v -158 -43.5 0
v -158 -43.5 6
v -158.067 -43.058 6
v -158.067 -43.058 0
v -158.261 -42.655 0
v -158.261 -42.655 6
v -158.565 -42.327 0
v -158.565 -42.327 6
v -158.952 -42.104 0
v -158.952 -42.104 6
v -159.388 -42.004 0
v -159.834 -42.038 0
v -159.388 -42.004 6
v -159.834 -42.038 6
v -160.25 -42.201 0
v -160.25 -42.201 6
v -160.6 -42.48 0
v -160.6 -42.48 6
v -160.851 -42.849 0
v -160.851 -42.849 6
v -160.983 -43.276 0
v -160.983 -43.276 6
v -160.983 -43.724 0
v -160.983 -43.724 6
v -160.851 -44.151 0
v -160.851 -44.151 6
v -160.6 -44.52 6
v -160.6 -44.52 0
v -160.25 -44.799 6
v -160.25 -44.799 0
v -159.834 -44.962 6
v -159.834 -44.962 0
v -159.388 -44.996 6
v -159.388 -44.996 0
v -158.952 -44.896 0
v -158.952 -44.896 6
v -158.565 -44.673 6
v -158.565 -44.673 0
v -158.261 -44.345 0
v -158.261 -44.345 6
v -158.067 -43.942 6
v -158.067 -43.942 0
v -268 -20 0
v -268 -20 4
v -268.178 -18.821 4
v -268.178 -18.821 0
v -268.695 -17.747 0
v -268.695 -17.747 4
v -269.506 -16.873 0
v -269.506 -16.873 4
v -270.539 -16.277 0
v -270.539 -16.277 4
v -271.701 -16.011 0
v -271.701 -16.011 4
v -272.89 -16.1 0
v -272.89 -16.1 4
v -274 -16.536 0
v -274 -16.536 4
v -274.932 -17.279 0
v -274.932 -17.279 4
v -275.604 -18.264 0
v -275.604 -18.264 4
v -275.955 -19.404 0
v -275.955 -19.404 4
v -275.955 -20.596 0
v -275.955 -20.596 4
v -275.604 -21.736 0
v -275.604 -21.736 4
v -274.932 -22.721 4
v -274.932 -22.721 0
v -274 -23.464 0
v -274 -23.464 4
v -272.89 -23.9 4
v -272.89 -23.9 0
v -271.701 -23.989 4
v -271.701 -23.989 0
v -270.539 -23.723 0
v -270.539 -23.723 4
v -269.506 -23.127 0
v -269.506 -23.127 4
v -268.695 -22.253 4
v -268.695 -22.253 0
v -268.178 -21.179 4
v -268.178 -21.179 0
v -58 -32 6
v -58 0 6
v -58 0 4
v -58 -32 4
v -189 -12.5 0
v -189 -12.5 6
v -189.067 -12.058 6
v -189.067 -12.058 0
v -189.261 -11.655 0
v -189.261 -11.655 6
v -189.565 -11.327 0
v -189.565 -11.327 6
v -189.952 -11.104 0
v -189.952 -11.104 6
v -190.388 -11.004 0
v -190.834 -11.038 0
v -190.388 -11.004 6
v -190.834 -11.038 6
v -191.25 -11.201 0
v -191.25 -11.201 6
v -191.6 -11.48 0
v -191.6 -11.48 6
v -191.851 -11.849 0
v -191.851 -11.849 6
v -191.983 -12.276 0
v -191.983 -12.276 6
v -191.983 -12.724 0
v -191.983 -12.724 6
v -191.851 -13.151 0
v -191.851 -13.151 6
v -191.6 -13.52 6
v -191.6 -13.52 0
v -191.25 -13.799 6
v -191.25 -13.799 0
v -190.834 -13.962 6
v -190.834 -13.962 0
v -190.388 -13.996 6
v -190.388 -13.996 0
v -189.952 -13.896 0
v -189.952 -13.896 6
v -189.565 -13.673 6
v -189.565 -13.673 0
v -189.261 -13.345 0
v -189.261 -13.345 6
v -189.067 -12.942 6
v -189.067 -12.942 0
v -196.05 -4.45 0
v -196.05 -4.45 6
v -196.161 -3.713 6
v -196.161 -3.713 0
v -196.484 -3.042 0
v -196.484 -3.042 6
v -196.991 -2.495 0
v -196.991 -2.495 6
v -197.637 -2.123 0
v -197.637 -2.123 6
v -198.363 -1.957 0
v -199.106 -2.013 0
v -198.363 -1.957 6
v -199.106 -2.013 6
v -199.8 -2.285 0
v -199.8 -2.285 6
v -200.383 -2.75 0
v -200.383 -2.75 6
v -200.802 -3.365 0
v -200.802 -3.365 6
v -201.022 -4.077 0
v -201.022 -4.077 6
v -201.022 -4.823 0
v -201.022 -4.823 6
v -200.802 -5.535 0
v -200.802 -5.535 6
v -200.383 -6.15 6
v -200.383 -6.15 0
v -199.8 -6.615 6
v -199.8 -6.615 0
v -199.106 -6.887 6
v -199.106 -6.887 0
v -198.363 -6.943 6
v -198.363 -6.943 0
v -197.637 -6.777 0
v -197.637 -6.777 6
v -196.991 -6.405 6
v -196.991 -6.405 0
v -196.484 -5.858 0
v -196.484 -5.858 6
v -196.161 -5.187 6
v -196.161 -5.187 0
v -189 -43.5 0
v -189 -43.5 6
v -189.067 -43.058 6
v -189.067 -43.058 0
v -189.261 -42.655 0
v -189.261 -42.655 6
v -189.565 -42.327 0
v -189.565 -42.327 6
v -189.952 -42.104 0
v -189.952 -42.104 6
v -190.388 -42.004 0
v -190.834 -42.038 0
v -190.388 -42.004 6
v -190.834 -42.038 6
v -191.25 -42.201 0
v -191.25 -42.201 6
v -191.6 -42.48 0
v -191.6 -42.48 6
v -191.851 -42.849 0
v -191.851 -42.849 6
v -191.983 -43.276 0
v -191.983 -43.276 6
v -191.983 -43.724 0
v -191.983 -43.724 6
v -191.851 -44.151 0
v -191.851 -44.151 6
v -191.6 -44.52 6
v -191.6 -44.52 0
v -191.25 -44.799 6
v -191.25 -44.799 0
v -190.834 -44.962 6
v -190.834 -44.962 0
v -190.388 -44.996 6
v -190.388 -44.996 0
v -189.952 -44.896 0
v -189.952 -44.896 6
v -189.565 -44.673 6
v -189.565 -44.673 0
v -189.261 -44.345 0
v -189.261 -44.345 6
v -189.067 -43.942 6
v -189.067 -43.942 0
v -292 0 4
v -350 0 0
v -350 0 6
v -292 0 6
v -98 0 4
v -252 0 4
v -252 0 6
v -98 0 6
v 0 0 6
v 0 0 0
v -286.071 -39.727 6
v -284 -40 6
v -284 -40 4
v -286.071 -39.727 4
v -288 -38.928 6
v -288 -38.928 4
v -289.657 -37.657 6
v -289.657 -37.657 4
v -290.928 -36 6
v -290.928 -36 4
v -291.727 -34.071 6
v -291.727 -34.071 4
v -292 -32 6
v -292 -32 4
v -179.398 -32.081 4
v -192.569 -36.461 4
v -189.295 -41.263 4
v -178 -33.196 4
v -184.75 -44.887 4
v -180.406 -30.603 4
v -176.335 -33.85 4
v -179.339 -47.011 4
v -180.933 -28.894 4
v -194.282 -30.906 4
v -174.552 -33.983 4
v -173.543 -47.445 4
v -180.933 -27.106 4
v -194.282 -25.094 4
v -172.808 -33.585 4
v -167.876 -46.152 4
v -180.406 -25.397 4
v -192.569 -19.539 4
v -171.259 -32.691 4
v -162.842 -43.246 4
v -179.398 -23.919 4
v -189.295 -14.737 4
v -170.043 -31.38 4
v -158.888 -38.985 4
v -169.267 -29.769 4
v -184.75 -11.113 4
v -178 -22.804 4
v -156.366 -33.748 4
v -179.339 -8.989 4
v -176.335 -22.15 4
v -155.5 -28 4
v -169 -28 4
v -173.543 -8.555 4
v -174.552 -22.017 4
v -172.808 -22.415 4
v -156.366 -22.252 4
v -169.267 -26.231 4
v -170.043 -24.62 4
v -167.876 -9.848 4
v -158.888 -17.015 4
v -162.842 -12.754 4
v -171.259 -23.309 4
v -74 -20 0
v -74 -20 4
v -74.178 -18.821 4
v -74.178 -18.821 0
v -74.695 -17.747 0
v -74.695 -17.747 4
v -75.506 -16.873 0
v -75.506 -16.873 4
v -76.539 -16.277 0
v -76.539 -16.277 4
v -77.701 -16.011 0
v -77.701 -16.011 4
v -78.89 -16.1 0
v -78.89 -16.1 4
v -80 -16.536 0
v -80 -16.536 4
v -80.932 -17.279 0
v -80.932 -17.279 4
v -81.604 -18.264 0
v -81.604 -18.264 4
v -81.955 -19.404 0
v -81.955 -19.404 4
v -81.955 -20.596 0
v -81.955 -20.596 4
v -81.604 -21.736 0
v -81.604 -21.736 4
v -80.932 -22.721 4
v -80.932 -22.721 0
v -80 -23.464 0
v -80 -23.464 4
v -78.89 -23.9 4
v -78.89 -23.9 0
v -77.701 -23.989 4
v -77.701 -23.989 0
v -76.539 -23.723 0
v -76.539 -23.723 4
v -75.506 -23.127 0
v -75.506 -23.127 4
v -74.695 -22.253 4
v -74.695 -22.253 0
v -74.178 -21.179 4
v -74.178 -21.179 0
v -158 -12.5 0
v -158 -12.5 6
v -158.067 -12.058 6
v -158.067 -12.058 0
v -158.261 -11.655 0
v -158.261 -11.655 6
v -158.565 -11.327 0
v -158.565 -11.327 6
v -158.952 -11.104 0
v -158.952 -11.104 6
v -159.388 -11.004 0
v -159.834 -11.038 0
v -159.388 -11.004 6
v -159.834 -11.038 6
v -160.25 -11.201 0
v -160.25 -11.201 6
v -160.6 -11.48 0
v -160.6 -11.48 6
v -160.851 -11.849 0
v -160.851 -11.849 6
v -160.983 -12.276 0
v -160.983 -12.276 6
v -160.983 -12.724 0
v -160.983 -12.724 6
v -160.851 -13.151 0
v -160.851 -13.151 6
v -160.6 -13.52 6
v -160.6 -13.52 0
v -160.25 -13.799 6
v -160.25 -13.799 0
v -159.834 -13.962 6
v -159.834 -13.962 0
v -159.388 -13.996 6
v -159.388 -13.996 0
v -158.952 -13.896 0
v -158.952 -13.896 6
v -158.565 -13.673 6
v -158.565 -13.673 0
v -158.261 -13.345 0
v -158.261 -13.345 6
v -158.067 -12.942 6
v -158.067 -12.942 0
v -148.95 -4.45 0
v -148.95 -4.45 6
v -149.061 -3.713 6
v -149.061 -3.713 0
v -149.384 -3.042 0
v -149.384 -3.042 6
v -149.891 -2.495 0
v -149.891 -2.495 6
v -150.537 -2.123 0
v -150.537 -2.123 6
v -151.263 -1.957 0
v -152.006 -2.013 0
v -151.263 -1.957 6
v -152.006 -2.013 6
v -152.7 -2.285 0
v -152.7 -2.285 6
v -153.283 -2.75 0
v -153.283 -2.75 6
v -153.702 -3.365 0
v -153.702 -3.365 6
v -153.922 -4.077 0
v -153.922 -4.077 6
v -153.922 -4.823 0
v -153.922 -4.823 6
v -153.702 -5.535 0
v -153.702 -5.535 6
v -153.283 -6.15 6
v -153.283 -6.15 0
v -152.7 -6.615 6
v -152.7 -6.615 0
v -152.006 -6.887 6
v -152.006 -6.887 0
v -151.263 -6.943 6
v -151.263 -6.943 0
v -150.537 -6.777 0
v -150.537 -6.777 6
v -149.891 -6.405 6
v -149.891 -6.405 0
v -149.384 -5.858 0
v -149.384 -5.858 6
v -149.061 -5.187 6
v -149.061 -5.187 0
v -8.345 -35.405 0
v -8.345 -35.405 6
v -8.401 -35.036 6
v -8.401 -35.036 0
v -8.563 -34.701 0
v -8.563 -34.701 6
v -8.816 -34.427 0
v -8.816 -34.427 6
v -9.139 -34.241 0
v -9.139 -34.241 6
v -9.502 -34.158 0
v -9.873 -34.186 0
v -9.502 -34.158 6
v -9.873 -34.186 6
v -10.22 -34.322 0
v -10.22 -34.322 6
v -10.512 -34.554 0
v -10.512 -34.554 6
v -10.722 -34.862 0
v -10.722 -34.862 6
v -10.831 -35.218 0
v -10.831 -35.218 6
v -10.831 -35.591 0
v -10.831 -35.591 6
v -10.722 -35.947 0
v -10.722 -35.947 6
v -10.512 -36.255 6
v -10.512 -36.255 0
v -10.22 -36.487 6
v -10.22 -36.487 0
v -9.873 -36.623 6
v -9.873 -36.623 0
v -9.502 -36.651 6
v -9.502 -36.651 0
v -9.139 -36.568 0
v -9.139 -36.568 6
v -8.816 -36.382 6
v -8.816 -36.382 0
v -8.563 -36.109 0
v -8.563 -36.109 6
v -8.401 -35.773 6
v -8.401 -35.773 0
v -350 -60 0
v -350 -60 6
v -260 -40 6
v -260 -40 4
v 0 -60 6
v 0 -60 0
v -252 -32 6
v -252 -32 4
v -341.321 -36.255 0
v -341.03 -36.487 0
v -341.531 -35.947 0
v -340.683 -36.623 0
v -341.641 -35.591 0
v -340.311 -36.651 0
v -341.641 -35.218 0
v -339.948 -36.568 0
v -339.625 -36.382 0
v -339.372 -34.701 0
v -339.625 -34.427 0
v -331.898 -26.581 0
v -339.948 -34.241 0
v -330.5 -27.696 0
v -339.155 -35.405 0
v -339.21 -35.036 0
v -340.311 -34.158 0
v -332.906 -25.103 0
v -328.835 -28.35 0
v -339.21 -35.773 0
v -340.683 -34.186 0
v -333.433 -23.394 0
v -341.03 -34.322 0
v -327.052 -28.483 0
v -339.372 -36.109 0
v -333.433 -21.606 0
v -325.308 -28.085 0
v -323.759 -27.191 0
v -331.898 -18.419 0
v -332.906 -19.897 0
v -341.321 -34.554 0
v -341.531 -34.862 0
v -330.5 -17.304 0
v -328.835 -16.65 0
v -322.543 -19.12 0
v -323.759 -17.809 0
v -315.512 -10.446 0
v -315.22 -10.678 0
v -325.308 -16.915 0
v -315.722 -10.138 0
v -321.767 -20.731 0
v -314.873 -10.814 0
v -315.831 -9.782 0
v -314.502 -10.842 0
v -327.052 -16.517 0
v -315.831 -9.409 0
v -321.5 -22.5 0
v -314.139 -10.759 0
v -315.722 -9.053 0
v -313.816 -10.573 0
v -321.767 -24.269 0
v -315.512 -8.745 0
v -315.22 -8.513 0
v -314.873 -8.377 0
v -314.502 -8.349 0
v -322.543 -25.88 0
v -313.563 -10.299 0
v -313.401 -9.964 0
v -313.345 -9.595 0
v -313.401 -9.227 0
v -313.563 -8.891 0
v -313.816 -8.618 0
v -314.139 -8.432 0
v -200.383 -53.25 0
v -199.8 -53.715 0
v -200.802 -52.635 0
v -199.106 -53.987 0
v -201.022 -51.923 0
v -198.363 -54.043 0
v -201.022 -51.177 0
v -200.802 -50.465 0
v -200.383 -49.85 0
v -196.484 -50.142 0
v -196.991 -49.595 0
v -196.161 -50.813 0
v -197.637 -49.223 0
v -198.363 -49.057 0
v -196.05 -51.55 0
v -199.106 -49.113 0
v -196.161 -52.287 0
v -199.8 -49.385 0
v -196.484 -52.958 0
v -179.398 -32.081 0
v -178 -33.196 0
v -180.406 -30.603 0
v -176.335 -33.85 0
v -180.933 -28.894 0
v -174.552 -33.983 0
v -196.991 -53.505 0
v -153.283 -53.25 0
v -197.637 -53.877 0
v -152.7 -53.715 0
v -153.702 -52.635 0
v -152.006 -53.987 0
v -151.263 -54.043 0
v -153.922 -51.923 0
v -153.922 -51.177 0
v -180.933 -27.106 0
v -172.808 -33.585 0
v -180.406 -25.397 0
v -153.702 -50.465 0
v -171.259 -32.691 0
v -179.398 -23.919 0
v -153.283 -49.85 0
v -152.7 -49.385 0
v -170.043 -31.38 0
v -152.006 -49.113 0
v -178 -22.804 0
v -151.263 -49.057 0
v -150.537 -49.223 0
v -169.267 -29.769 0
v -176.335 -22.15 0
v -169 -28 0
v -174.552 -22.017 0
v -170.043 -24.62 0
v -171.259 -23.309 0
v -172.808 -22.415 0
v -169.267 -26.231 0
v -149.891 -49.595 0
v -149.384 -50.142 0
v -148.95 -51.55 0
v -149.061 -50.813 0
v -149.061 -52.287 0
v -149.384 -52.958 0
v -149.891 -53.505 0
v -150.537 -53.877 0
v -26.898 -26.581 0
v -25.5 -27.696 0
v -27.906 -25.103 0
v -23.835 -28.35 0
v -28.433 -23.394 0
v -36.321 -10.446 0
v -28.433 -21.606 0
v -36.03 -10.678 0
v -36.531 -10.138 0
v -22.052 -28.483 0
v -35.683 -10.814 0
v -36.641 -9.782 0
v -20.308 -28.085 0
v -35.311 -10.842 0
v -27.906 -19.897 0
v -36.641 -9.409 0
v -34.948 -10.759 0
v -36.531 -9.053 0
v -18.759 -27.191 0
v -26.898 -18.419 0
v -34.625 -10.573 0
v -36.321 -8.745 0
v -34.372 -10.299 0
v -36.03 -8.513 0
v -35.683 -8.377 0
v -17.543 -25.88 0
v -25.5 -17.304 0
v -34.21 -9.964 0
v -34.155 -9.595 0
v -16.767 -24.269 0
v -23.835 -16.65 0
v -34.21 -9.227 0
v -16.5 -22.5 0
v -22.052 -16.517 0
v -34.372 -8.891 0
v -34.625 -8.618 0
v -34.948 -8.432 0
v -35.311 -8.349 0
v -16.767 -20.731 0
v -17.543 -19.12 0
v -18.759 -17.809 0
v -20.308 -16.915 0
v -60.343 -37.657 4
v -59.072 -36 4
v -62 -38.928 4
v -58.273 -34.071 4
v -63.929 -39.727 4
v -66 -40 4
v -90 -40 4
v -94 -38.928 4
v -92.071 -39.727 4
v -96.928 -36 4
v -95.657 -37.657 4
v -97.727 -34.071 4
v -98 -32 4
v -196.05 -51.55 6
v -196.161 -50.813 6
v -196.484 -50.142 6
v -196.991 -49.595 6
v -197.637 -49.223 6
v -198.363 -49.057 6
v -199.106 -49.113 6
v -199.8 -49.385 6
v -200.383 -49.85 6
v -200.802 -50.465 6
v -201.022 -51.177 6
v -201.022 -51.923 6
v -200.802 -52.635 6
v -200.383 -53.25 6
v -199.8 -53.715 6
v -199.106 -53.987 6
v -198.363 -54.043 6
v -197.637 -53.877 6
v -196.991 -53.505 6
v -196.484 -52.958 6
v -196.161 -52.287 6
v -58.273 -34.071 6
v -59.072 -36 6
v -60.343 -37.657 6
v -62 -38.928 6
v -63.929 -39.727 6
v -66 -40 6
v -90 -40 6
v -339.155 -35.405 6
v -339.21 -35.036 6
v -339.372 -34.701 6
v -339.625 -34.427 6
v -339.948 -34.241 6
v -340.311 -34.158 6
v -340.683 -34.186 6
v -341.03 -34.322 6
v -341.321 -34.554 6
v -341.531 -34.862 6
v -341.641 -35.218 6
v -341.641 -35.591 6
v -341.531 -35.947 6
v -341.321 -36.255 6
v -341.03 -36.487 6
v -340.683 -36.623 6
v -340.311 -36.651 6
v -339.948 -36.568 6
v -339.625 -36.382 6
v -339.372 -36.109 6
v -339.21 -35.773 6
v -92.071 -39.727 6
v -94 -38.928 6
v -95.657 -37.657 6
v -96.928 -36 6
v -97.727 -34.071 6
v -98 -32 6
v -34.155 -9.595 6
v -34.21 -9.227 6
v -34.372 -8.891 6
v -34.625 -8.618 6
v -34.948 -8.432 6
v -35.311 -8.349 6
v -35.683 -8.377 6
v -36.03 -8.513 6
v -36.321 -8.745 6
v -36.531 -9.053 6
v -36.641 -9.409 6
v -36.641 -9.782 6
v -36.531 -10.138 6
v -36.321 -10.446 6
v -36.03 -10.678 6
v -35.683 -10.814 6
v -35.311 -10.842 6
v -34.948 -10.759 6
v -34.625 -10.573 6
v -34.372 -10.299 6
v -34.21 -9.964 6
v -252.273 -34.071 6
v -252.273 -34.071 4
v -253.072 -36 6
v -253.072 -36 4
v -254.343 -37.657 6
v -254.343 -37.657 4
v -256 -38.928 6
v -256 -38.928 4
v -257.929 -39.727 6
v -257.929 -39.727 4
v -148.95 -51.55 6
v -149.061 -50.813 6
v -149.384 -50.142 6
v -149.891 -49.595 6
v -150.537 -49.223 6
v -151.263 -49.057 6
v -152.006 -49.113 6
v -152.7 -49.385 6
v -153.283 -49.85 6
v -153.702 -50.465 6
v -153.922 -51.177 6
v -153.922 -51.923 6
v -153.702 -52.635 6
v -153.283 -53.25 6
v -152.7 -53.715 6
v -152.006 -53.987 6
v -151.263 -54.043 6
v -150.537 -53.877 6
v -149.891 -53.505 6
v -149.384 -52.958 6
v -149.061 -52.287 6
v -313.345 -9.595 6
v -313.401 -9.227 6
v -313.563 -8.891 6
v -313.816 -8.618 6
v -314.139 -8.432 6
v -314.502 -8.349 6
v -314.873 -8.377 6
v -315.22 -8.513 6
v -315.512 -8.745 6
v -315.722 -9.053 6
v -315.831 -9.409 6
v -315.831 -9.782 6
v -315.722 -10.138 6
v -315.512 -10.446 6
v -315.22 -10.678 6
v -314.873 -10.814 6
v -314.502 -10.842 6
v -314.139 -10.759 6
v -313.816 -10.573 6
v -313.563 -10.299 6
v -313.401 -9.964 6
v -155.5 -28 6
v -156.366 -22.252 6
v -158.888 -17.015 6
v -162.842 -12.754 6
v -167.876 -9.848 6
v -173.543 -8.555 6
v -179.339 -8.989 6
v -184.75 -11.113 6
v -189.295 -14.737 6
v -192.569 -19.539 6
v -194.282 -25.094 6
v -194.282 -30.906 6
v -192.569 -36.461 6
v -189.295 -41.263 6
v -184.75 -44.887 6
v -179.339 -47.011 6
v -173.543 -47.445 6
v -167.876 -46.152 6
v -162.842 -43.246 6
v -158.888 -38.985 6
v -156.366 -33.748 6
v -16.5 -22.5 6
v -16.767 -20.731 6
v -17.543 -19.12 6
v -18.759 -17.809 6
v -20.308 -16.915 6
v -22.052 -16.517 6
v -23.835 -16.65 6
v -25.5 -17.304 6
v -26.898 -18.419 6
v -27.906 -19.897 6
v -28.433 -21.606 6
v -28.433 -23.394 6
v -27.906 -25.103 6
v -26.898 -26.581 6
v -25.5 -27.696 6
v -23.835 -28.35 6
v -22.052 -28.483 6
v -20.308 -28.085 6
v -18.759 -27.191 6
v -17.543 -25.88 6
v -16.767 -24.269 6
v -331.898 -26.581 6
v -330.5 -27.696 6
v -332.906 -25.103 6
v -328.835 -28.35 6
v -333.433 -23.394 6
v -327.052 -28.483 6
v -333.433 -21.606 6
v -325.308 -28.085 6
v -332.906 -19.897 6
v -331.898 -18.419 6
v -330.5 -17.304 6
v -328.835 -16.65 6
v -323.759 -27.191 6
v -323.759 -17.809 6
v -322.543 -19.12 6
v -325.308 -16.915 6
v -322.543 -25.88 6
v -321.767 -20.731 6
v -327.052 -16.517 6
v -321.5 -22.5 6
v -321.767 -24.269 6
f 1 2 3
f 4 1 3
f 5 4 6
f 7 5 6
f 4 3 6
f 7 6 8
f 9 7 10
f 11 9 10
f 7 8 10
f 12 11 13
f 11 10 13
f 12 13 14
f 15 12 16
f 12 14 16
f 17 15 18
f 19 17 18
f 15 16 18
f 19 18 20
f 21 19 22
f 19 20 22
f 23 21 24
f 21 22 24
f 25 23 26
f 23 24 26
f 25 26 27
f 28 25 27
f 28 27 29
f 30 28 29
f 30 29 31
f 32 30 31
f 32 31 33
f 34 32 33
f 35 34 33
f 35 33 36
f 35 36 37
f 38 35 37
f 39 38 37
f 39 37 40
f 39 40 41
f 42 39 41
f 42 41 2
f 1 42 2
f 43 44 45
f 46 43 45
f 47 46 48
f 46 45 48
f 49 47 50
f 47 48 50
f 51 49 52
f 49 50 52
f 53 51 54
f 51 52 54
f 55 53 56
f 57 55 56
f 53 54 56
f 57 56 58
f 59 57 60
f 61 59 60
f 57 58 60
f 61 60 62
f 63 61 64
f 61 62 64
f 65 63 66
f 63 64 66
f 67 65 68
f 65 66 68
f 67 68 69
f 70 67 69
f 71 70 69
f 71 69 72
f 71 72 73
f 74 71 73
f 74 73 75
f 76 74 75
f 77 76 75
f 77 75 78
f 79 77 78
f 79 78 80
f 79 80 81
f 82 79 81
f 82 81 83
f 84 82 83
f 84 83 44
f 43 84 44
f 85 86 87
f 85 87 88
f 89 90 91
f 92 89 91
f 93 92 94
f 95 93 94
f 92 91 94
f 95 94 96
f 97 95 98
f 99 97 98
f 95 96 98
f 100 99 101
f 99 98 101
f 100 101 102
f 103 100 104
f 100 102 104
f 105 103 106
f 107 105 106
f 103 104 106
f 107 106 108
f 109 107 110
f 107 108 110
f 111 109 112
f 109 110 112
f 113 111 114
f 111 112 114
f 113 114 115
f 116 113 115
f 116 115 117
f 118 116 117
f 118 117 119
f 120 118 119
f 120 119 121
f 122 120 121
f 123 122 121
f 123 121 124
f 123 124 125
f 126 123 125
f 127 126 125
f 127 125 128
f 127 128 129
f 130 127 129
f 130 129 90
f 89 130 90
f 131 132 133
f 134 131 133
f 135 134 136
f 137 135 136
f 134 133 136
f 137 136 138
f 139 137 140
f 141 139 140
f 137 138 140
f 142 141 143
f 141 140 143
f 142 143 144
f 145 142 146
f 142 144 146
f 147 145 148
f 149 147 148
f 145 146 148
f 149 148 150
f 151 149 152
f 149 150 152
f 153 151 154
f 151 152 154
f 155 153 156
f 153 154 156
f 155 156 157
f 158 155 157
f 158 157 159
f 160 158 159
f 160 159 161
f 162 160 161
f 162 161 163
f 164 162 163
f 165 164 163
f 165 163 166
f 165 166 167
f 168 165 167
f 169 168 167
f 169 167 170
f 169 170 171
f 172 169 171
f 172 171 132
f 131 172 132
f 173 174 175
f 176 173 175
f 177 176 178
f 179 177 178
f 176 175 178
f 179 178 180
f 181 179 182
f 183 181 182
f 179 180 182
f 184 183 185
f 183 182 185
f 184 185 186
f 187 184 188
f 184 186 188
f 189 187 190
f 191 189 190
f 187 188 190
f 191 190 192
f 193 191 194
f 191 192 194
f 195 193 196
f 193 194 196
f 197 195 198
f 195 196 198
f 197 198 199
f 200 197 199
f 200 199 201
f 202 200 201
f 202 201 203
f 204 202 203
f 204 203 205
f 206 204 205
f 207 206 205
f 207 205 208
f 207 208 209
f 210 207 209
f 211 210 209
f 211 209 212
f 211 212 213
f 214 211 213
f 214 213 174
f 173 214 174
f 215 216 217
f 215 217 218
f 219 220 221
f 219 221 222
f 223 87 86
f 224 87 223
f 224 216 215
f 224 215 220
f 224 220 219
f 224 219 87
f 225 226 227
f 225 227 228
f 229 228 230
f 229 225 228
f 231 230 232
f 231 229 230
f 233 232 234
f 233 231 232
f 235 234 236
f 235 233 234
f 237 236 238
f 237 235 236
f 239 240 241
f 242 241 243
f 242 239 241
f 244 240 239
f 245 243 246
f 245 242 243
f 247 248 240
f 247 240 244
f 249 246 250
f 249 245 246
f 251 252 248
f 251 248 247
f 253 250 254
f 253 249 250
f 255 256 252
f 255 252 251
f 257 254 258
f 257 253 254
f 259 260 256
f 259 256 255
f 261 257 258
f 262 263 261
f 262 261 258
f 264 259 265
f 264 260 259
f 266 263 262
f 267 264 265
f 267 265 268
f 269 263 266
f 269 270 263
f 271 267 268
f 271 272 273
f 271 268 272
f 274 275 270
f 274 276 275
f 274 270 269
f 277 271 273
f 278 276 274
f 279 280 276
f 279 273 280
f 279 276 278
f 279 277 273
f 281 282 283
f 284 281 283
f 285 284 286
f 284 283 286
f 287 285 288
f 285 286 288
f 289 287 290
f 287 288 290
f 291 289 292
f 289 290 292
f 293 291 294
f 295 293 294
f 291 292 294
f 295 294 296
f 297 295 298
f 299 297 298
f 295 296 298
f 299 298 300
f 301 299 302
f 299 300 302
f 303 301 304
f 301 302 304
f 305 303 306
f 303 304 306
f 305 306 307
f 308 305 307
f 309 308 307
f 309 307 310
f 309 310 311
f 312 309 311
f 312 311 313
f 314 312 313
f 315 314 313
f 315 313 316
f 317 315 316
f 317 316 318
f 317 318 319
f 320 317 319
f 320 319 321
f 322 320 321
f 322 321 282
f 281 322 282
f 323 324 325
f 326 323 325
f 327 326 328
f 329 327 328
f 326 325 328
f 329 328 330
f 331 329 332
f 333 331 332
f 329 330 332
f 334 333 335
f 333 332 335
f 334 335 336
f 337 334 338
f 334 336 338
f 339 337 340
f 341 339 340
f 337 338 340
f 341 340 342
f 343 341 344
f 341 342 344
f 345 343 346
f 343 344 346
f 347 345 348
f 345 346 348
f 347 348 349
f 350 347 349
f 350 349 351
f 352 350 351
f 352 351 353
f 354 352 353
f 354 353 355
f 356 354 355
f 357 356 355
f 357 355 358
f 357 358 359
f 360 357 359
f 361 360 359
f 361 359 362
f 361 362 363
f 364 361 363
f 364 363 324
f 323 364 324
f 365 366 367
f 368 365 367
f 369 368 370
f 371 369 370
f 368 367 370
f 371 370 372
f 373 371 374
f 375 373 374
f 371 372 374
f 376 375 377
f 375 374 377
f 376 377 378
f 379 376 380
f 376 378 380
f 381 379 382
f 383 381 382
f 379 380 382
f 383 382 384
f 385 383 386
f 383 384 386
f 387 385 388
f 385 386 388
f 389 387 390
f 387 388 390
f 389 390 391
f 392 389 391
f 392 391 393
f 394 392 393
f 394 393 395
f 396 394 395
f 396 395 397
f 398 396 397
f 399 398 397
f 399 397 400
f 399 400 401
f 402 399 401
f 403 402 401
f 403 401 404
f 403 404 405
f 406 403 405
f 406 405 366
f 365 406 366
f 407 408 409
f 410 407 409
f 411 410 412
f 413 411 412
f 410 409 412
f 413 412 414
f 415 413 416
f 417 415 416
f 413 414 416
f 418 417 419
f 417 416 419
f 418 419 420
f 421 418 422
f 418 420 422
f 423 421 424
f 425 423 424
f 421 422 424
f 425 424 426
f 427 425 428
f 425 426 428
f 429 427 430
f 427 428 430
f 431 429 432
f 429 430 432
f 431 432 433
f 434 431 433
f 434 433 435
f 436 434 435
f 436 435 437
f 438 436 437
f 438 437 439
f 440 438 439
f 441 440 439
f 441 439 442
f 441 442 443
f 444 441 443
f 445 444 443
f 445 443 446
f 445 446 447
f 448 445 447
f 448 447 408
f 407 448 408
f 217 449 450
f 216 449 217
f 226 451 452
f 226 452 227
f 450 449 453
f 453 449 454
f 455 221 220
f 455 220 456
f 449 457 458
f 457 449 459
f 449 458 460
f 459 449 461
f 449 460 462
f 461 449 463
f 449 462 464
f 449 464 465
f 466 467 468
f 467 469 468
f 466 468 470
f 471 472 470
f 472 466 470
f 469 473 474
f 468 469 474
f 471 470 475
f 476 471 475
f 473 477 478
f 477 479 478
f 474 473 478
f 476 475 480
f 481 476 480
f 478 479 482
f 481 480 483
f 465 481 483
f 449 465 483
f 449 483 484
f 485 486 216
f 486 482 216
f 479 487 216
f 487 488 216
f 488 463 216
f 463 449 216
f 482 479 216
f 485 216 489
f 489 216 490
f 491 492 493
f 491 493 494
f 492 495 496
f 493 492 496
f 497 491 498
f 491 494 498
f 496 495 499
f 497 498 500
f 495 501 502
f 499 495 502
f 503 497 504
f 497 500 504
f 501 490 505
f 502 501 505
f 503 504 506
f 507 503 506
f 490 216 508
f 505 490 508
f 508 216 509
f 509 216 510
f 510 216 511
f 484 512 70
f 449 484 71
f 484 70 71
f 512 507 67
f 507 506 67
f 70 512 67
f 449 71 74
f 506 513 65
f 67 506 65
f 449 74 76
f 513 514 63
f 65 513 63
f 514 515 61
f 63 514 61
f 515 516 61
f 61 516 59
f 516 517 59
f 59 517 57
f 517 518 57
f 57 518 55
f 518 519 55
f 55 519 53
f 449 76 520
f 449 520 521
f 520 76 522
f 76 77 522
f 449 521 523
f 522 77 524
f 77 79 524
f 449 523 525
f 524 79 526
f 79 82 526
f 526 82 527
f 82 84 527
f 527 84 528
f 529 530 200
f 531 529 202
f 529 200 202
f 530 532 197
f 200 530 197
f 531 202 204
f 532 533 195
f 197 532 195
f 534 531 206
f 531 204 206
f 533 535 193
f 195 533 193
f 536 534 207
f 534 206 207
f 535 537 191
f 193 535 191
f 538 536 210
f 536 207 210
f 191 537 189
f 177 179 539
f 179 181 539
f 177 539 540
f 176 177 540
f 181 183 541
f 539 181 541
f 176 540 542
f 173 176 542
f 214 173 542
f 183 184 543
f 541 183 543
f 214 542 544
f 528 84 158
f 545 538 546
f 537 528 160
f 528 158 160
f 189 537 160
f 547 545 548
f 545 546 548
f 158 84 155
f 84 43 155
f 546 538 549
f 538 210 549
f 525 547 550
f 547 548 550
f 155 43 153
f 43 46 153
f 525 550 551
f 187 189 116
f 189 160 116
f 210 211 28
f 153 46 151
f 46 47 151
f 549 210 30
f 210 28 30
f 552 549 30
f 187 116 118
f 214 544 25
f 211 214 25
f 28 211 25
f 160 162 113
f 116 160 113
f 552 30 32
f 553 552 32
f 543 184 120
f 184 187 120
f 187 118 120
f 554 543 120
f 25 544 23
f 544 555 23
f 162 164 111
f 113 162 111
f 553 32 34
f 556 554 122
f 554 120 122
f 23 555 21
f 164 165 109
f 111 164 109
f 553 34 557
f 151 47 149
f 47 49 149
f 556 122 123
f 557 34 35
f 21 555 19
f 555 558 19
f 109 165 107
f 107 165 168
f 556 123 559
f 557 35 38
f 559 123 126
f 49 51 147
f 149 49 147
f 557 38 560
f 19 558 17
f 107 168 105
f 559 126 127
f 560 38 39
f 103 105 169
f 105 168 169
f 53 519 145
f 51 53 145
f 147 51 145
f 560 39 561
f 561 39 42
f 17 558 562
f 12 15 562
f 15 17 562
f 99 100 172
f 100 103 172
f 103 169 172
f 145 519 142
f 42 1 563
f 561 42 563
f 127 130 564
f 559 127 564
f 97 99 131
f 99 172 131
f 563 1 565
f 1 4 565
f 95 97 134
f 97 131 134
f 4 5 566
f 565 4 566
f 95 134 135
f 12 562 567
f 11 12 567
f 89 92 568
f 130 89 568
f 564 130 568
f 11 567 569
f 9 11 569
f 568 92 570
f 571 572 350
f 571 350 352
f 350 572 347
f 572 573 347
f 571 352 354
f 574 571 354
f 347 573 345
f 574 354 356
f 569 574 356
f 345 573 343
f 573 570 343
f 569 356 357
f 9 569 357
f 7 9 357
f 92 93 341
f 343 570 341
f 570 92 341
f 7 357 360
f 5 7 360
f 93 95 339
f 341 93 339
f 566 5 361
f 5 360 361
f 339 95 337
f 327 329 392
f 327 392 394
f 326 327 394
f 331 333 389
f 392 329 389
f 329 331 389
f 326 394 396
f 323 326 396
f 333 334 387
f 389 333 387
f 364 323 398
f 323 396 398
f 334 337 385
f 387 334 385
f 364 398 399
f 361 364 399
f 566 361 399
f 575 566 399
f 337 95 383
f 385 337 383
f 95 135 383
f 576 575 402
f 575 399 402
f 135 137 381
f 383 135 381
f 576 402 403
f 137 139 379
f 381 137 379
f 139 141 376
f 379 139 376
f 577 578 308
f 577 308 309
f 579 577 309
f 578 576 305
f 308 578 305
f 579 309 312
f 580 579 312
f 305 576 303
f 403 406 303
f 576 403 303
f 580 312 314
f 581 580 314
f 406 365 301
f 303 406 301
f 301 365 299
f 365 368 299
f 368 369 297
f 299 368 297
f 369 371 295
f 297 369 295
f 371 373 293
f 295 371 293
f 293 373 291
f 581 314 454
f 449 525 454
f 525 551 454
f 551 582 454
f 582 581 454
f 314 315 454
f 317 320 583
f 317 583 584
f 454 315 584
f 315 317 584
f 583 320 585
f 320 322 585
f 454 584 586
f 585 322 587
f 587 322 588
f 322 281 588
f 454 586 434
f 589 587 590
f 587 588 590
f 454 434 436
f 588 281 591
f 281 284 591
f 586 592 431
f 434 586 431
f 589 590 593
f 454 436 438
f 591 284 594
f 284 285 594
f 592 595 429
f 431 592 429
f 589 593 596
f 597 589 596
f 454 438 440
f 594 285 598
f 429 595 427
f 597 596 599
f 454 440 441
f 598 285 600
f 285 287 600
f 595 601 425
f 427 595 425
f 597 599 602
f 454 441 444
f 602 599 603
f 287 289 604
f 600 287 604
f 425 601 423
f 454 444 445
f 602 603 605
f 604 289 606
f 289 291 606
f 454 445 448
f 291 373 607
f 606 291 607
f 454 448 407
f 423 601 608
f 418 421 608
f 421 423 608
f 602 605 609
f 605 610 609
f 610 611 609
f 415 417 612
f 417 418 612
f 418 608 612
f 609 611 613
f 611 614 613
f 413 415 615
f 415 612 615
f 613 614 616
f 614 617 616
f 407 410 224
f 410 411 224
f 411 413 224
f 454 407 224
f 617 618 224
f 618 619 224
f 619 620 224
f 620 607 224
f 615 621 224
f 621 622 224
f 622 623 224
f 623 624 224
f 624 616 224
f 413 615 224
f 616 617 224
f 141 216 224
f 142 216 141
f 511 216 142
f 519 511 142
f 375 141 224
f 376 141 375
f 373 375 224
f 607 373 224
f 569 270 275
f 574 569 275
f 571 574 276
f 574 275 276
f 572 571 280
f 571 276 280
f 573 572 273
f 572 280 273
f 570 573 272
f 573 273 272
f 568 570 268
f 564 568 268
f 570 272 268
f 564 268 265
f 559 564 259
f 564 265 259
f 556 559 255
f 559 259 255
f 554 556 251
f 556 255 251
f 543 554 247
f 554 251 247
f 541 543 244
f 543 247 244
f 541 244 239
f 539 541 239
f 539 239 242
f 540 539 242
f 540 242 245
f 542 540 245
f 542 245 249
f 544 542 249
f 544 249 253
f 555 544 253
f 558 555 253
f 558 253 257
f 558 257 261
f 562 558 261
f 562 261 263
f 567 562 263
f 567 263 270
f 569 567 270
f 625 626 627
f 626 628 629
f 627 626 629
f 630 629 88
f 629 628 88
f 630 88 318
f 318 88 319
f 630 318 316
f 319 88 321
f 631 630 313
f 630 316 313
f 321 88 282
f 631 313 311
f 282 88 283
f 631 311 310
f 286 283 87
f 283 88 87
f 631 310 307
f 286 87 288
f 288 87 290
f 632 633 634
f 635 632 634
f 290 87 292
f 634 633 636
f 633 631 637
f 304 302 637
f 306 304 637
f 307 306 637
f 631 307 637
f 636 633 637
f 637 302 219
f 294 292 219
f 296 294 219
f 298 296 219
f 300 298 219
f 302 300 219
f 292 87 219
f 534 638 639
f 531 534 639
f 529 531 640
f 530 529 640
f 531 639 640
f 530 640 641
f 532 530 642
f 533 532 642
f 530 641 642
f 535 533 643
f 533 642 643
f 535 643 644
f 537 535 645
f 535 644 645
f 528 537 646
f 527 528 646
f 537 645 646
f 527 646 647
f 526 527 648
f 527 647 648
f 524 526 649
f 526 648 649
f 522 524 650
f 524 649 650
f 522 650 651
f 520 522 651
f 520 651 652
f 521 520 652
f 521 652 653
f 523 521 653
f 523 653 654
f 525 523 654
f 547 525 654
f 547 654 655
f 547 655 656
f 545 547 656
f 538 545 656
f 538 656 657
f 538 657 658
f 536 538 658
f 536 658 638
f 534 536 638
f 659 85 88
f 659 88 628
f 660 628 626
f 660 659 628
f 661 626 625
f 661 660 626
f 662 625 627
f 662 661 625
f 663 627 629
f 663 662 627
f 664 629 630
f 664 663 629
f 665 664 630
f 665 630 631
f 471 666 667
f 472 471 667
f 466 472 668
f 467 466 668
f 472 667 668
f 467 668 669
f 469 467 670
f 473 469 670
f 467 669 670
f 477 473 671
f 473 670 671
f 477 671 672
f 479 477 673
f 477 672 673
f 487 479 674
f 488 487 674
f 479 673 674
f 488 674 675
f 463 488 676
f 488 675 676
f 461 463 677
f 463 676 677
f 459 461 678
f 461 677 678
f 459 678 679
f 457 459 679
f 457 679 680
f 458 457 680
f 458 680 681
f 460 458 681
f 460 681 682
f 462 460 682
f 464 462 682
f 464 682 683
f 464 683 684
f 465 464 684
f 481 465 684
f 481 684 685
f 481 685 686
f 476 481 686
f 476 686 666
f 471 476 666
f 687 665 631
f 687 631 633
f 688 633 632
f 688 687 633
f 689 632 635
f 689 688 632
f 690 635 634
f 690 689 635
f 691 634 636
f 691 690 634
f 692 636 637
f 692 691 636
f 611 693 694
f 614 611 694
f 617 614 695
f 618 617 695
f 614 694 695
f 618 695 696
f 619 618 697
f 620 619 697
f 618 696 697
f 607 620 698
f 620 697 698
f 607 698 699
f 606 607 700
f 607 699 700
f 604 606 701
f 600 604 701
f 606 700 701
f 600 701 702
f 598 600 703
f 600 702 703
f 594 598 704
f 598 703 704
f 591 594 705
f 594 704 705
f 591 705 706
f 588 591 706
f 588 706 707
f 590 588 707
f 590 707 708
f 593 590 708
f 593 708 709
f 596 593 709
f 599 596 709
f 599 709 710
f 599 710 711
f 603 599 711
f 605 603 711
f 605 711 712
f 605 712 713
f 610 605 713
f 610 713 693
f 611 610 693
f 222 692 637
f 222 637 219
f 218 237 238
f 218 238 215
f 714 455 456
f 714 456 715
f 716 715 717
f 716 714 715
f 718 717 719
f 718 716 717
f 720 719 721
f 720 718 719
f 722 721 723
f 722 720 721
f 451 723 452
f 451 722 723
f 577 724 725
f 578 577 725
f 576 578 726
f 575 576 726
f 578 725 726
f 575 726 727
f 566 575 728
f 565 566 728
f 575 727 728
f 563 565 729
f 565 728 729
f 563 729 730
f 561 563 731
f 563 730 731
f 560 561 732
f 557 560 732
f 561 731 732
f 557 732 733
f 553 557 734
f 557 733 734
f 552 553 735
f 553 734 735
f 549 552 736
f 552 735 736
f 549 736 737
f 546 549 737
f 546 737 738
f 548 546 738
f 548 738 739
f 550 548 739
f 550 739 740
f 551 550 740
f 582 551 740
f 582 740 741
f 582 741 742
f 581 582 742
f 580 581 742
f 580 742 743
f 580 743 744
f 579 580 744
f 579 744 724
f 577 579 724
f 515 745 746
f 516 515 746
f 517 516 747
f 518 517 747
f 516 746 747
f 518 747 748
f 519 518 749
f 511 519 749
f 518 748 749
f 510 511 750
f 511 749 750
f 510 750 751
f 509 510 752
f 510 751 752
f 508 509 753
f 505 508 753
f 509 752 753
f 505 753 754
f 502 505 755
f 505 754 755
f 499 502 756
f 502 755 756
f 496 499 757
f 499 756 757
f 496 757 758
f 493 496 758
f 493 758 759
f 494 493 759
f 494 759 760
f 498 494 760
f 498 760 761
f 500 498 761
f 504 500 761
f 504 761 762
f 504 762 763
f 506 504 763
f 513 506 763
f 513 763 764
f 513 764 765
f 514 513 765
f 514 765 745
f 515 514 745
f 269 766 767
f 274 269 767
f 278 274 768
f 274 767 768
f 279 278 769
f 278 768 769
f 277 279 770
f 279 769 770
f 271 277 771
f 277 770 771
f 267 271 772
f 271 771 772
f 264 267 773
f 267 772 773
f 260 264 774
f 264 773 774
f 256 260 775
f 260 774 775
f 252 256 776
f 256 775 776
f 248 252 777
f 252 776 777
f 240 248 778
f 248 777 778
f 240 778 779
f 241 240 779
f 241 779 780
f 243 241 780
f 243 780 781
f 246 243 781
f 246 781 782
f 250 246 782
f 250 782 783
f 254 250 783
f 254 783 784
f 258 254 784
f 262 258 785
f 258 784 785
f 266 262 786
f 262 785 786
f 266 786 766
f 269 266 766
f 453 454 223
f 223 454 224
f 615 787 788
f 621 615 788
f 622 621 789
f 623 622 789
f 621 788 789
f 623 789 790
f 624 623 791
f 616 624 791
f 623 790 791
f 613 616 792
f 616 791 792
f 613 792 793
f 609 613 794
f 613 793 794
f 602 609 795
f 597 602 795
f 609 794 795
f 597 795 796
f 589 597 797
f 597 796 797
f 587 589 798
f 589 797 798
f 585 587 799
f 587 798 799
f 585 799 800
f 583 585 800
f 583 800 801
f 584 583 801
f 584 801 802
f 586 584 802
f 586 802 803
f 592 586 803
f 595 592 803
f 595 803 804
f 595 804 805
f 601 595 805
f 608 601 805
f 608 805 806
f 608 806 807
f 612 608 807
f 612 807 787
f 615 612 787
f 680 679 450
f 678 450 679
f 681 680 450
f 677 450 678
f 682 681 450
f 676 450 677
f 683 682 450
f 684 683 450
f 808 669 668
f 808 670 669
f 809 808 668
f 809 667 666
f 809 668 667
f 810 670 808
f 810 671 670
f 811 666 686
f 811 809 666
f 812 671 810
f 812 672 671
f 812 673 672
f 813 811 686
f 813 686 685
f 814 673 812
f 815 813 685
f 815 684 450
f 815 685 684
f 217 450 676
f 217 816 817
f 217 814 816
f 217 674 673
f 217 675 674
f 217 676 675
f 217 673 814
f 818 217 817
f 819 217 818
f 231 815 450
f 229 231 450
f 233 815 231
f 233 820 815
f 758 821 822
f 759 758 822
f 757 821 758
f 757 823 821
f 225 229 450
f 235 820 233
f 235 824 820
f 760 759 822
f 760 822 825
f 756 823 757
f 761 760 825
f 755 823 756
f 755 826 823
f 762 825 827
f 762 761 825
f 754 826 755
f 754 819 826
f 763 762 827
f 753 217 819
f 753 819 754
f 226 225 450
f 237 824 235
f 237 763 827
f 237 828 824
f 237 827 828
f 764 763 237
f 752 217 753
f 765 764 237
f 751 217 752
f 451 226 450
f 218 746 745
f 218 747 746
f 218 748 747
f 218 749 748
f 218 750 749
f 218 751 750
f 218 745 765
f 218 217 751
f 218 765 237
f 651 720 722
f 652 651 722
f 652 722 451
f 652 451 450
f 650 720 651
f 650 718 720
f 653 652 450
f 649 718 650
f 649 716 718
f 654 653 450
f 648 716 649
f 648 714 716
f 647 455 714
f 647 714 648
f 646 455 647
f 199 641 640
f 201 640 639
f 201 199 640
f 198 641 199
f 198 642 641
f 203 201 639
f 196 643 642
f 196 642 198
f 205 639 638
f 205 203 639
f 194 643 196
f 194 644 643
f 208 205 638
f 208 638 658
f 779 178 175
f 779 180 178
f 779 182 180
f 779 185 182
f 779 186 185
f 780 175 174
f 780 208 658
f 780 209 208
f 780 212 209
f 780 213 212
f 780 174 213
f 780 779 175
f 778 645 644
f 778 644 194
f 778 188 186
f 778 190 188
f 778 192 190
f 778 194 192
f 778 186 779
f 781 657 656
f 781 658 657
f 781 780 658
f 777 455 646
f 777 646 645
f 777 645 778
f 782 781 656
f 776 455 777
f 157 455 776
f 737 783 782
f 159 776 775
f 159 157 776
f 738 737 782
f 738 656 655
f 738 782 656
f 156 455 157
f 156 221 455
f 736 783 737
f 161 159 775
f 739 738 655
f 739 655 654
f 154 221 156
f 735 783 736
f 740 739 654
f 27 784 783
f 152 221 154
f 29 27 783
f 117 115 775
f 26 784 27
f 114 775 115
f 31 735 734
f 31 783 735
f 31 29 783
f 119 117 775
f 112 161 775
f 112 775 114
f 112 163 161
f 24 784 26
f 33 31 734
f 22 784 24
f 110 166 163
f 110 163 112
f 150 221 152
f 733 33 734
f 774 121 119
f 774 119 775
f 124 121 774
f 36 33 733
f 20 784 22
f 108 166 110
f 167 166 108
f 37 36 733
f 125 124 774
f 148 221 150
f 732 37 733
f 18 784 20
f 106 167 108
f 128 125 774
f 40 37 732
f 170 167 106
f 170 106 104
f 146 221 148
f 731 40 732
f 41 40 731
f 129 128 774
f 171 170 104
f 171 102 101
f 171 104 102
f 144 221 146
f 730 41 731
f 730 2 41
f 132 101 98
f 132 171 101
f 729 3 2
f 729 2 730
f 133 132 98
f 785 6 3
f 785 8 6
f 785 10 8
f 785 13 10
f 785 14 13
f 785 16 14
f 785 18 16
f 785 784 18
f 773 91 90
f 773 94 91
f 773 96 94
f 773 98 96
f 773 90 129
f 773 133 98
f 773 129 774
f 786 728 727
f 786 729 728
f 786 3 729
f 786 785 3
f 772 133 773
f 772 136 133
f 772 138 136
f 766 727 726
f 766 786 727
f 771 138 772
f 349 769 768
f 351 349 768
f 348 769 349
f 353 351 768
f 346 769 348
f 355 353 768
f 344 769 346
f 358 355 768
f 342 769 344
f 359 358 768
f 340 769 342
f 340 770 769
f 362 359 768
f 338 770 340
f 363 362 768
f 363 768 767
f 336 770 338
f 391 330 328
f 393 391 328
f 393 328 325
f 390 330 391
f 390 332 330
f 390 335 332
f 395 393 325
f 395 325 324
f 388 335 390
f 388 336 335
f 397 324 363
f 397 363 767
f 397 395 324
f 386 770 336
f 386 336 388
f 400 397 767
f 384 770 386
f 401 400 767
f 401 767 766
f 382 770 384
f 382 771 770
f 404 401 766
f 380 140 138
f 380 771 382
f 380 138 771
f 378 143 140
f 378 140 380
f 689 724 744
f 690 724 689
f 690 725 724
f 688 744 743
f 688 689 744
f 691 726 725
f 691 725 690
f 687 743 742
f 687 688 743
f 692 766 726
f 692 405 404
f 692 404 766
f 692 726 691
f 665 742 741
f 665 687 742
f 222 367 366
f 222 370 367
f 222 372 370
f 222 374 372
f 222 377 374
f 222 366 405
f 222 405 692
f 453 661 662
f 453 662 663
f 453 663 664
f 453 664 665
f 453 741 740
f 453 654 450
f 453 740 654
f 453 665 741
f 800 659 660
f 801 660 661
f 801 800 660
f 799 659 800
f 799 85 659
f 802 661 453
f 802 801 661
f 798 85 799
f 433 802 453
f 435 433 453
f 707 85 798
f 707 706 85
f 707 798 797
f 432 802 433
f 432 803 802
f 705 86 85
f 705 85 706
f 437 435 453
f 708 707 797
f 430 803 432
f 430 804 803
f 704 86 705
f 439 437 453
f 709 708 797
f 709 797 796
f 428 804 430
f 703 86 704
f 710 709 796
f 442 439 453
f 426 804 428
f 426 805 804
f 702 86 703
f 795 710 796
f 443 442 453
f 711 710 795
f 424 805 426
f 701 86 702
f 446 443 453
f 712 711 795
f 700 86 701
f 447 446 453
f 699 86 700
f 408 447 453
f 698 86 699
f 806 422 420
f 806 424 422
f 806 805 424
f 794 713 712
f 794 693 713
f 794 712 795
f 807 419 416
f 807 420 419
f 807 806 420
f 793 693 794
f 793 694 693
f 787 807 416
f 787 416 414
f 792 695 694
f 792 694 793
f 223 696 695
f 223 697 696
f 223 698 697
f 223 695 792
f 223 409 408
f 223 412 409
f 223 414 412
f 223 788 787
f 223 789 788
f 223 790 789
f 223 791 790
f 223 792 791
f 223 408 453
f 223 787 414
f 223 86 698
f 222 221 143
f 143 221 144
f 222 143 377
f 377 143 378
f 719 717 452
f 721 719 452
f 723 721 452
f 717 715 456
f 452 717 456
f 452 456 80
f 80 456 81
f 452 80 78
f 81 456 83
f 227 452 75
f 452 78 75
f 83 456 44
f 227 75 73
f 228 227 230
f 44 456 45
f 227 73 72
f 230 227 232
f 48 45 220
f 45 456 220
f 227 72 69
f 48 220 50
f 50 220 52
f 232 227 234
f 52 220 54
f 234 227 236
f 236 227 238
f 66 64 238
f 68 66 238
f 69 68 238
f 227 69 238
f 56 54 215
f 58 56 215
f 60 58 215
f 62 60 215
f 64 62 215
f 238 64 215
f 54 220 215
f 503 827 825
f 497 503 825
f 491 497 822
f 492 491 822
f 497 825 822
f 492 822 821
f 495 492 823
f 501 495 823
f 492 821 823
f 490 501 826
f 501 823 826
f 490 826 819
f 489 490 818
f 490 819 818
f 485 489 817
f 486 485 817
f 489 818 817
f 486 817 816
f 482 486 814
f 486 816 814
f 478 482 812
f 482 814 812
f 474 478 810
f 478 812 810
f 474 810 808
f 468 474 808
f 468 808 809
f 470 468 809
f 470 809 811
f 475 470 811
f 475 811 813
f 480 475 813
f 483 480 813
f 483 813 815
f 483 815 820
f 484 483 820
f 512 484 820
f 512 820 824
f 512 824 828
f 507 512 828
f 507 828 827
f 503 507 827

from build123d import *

# Parameters (mm, degrees)
CROQUIS1_W              = 350
CROQUIS1_H              = 60
SALIENTE_EXTRUIR1_DEPTH = 6
CROQUIS2_R              = 6
CROQUIS2_R_2            = 1.25
CORTAR_EXTRUIR1_DEPTH   = 7
CROQUIS3_R              = 6
CROQUIS3_R_2            = 1.5
CROQUIS3_R_3            = 2.5
CORTAR_EXTRUIR2_DEPTH   = 7
CROQUIS5_R              = 19.5
CORTAR_EXTRUIR4_DEPTH   = 2
CROQUIS7_R              = 4
CORTAR_EXTRUIR5_DEPTH   = 5


with BuildPart() as part:
    # Croquis1 → Saliente-Extruir1 (new body)
    with BuildSketch(Plane.XY):
        with Locations((-175, -30)):
            Rectangle(CROQUIS1_W, CROQUIS1_H)
    extrude(amount=SALIENTE_EXTRUIR1_DEPTH)

    # Croquis2 → Cortar-Extruir1 (cut, through all)
    with BuildSketch(Plane.XY.offset(6)):
        with Locations((-327.5, -22.5)):
            Circle(CROQUIS2_R)
        with Locations((-22.5, -22.5)):
            Circle(CROQUIS2_R)
        with Locations((-314.595301243, -9.595301243)):
            Circle(CROQUIS2_R_2)
        with Locations((-340.404698757, -35.404698757)):
            Circle(CROQUIS2_R_2)
        with Locations((-35.404698757, -9.595301243)):
            Circle(CROQUIS2_R_2)
        with Locations((-9.595301243, -35.404698757)):
            Circle(CROQUIS2_R_2)
    extrude(amount=-CORTAR_EXTRUIR1_DEPTH, mode=Mode.SUBTRACT)

    # Croquis3 → Cortar-Extruir2 (cut, through all)
    with BuildSketch(Plane.XY.offset(6)):
        with Locations((-175, -28)):
            Circle(CROQUIS3_R)
        with Locations((-190.5, -12.5)):
            Circle(CROQUIS3_R_2)
        with Locations((-159.5, -12.5)):
            Circle(CROQUIS3_R_2)
        with Locations((-190.5, -43.5)):
            Circle(CROQUIS3_R_2)
        with Locations((-151.45, -51.55)):
            Circle(CROQUIS3_R_3)
        with Locations((-198.55, -51.55)):
            Circle(CROQUIS3_R_3)
        with Locations((-159.5, -43.5)):
            Circle(CROQUIS3_R_2)
        with Locations((-151.45, -4.45)):
            Circle(CROQUIS3_R_3)
        with Locations((-198.55, -4.45)):
            Circle(CROQUIS3_R_3)
    extrude(amount=-CORTAR_EXTRUIR2_DEPTH, mode=Mode.SUBTRACT)

    # Croquis5 → Cortar-Extruir4 (cut)
    with BuildSketch(Plane.XY.offset(6)):
        with Locations((-175, -28)):
            Circle(CROQUIS5_R)
        with BuildLine():
            Line((-292, 0), (-252, 0))
            Line((-252, 0), (-252, -32))
            ThreePointArc((-252, -32), (-254.343145751, -37.656854249), (-260, -40))
            Line((-260, -40), (-284, -40))
            ThreePointArc((-284, -40), (-289.656854249, -37.656854249), (-292, -32))
            Line((-292, -32), (-292, 0))
        make_face()
        with BuildLine():
            Line((-98, 0), (-58, 0))
            Line((-58, 0), (-58, -32))
            ThreePointArc((-58, -32), (-60.343145751, -37.656854249), (-66, -40))
            Line((-66, -40), (-90, -40))
            ThreePointArc((-90, -40), (-95.656854249, -37.656854249), (-98, -32))
            Line((-98, -32), (-98, 0))
        make_face()
    extrude(amount=-CORTAR_EXTRUIR4_DEPTH, mode=Mode.SUBTRACT)

    # Croquis7 → Cortar-Extruir5 (cut, through all)
    with BuildSketch(Plane.XY.offset(4)):
        with Locations((-272, -20)):
            Circle(CROQUIS7_R)
        with Locations((-78, -20)):
            Circle(CROQUIS7_R)
    extrude(amount=-CORTAR_EXTRUIR5_DEPTH, mode=Mode.SUBTRACT)


solid = part.part
